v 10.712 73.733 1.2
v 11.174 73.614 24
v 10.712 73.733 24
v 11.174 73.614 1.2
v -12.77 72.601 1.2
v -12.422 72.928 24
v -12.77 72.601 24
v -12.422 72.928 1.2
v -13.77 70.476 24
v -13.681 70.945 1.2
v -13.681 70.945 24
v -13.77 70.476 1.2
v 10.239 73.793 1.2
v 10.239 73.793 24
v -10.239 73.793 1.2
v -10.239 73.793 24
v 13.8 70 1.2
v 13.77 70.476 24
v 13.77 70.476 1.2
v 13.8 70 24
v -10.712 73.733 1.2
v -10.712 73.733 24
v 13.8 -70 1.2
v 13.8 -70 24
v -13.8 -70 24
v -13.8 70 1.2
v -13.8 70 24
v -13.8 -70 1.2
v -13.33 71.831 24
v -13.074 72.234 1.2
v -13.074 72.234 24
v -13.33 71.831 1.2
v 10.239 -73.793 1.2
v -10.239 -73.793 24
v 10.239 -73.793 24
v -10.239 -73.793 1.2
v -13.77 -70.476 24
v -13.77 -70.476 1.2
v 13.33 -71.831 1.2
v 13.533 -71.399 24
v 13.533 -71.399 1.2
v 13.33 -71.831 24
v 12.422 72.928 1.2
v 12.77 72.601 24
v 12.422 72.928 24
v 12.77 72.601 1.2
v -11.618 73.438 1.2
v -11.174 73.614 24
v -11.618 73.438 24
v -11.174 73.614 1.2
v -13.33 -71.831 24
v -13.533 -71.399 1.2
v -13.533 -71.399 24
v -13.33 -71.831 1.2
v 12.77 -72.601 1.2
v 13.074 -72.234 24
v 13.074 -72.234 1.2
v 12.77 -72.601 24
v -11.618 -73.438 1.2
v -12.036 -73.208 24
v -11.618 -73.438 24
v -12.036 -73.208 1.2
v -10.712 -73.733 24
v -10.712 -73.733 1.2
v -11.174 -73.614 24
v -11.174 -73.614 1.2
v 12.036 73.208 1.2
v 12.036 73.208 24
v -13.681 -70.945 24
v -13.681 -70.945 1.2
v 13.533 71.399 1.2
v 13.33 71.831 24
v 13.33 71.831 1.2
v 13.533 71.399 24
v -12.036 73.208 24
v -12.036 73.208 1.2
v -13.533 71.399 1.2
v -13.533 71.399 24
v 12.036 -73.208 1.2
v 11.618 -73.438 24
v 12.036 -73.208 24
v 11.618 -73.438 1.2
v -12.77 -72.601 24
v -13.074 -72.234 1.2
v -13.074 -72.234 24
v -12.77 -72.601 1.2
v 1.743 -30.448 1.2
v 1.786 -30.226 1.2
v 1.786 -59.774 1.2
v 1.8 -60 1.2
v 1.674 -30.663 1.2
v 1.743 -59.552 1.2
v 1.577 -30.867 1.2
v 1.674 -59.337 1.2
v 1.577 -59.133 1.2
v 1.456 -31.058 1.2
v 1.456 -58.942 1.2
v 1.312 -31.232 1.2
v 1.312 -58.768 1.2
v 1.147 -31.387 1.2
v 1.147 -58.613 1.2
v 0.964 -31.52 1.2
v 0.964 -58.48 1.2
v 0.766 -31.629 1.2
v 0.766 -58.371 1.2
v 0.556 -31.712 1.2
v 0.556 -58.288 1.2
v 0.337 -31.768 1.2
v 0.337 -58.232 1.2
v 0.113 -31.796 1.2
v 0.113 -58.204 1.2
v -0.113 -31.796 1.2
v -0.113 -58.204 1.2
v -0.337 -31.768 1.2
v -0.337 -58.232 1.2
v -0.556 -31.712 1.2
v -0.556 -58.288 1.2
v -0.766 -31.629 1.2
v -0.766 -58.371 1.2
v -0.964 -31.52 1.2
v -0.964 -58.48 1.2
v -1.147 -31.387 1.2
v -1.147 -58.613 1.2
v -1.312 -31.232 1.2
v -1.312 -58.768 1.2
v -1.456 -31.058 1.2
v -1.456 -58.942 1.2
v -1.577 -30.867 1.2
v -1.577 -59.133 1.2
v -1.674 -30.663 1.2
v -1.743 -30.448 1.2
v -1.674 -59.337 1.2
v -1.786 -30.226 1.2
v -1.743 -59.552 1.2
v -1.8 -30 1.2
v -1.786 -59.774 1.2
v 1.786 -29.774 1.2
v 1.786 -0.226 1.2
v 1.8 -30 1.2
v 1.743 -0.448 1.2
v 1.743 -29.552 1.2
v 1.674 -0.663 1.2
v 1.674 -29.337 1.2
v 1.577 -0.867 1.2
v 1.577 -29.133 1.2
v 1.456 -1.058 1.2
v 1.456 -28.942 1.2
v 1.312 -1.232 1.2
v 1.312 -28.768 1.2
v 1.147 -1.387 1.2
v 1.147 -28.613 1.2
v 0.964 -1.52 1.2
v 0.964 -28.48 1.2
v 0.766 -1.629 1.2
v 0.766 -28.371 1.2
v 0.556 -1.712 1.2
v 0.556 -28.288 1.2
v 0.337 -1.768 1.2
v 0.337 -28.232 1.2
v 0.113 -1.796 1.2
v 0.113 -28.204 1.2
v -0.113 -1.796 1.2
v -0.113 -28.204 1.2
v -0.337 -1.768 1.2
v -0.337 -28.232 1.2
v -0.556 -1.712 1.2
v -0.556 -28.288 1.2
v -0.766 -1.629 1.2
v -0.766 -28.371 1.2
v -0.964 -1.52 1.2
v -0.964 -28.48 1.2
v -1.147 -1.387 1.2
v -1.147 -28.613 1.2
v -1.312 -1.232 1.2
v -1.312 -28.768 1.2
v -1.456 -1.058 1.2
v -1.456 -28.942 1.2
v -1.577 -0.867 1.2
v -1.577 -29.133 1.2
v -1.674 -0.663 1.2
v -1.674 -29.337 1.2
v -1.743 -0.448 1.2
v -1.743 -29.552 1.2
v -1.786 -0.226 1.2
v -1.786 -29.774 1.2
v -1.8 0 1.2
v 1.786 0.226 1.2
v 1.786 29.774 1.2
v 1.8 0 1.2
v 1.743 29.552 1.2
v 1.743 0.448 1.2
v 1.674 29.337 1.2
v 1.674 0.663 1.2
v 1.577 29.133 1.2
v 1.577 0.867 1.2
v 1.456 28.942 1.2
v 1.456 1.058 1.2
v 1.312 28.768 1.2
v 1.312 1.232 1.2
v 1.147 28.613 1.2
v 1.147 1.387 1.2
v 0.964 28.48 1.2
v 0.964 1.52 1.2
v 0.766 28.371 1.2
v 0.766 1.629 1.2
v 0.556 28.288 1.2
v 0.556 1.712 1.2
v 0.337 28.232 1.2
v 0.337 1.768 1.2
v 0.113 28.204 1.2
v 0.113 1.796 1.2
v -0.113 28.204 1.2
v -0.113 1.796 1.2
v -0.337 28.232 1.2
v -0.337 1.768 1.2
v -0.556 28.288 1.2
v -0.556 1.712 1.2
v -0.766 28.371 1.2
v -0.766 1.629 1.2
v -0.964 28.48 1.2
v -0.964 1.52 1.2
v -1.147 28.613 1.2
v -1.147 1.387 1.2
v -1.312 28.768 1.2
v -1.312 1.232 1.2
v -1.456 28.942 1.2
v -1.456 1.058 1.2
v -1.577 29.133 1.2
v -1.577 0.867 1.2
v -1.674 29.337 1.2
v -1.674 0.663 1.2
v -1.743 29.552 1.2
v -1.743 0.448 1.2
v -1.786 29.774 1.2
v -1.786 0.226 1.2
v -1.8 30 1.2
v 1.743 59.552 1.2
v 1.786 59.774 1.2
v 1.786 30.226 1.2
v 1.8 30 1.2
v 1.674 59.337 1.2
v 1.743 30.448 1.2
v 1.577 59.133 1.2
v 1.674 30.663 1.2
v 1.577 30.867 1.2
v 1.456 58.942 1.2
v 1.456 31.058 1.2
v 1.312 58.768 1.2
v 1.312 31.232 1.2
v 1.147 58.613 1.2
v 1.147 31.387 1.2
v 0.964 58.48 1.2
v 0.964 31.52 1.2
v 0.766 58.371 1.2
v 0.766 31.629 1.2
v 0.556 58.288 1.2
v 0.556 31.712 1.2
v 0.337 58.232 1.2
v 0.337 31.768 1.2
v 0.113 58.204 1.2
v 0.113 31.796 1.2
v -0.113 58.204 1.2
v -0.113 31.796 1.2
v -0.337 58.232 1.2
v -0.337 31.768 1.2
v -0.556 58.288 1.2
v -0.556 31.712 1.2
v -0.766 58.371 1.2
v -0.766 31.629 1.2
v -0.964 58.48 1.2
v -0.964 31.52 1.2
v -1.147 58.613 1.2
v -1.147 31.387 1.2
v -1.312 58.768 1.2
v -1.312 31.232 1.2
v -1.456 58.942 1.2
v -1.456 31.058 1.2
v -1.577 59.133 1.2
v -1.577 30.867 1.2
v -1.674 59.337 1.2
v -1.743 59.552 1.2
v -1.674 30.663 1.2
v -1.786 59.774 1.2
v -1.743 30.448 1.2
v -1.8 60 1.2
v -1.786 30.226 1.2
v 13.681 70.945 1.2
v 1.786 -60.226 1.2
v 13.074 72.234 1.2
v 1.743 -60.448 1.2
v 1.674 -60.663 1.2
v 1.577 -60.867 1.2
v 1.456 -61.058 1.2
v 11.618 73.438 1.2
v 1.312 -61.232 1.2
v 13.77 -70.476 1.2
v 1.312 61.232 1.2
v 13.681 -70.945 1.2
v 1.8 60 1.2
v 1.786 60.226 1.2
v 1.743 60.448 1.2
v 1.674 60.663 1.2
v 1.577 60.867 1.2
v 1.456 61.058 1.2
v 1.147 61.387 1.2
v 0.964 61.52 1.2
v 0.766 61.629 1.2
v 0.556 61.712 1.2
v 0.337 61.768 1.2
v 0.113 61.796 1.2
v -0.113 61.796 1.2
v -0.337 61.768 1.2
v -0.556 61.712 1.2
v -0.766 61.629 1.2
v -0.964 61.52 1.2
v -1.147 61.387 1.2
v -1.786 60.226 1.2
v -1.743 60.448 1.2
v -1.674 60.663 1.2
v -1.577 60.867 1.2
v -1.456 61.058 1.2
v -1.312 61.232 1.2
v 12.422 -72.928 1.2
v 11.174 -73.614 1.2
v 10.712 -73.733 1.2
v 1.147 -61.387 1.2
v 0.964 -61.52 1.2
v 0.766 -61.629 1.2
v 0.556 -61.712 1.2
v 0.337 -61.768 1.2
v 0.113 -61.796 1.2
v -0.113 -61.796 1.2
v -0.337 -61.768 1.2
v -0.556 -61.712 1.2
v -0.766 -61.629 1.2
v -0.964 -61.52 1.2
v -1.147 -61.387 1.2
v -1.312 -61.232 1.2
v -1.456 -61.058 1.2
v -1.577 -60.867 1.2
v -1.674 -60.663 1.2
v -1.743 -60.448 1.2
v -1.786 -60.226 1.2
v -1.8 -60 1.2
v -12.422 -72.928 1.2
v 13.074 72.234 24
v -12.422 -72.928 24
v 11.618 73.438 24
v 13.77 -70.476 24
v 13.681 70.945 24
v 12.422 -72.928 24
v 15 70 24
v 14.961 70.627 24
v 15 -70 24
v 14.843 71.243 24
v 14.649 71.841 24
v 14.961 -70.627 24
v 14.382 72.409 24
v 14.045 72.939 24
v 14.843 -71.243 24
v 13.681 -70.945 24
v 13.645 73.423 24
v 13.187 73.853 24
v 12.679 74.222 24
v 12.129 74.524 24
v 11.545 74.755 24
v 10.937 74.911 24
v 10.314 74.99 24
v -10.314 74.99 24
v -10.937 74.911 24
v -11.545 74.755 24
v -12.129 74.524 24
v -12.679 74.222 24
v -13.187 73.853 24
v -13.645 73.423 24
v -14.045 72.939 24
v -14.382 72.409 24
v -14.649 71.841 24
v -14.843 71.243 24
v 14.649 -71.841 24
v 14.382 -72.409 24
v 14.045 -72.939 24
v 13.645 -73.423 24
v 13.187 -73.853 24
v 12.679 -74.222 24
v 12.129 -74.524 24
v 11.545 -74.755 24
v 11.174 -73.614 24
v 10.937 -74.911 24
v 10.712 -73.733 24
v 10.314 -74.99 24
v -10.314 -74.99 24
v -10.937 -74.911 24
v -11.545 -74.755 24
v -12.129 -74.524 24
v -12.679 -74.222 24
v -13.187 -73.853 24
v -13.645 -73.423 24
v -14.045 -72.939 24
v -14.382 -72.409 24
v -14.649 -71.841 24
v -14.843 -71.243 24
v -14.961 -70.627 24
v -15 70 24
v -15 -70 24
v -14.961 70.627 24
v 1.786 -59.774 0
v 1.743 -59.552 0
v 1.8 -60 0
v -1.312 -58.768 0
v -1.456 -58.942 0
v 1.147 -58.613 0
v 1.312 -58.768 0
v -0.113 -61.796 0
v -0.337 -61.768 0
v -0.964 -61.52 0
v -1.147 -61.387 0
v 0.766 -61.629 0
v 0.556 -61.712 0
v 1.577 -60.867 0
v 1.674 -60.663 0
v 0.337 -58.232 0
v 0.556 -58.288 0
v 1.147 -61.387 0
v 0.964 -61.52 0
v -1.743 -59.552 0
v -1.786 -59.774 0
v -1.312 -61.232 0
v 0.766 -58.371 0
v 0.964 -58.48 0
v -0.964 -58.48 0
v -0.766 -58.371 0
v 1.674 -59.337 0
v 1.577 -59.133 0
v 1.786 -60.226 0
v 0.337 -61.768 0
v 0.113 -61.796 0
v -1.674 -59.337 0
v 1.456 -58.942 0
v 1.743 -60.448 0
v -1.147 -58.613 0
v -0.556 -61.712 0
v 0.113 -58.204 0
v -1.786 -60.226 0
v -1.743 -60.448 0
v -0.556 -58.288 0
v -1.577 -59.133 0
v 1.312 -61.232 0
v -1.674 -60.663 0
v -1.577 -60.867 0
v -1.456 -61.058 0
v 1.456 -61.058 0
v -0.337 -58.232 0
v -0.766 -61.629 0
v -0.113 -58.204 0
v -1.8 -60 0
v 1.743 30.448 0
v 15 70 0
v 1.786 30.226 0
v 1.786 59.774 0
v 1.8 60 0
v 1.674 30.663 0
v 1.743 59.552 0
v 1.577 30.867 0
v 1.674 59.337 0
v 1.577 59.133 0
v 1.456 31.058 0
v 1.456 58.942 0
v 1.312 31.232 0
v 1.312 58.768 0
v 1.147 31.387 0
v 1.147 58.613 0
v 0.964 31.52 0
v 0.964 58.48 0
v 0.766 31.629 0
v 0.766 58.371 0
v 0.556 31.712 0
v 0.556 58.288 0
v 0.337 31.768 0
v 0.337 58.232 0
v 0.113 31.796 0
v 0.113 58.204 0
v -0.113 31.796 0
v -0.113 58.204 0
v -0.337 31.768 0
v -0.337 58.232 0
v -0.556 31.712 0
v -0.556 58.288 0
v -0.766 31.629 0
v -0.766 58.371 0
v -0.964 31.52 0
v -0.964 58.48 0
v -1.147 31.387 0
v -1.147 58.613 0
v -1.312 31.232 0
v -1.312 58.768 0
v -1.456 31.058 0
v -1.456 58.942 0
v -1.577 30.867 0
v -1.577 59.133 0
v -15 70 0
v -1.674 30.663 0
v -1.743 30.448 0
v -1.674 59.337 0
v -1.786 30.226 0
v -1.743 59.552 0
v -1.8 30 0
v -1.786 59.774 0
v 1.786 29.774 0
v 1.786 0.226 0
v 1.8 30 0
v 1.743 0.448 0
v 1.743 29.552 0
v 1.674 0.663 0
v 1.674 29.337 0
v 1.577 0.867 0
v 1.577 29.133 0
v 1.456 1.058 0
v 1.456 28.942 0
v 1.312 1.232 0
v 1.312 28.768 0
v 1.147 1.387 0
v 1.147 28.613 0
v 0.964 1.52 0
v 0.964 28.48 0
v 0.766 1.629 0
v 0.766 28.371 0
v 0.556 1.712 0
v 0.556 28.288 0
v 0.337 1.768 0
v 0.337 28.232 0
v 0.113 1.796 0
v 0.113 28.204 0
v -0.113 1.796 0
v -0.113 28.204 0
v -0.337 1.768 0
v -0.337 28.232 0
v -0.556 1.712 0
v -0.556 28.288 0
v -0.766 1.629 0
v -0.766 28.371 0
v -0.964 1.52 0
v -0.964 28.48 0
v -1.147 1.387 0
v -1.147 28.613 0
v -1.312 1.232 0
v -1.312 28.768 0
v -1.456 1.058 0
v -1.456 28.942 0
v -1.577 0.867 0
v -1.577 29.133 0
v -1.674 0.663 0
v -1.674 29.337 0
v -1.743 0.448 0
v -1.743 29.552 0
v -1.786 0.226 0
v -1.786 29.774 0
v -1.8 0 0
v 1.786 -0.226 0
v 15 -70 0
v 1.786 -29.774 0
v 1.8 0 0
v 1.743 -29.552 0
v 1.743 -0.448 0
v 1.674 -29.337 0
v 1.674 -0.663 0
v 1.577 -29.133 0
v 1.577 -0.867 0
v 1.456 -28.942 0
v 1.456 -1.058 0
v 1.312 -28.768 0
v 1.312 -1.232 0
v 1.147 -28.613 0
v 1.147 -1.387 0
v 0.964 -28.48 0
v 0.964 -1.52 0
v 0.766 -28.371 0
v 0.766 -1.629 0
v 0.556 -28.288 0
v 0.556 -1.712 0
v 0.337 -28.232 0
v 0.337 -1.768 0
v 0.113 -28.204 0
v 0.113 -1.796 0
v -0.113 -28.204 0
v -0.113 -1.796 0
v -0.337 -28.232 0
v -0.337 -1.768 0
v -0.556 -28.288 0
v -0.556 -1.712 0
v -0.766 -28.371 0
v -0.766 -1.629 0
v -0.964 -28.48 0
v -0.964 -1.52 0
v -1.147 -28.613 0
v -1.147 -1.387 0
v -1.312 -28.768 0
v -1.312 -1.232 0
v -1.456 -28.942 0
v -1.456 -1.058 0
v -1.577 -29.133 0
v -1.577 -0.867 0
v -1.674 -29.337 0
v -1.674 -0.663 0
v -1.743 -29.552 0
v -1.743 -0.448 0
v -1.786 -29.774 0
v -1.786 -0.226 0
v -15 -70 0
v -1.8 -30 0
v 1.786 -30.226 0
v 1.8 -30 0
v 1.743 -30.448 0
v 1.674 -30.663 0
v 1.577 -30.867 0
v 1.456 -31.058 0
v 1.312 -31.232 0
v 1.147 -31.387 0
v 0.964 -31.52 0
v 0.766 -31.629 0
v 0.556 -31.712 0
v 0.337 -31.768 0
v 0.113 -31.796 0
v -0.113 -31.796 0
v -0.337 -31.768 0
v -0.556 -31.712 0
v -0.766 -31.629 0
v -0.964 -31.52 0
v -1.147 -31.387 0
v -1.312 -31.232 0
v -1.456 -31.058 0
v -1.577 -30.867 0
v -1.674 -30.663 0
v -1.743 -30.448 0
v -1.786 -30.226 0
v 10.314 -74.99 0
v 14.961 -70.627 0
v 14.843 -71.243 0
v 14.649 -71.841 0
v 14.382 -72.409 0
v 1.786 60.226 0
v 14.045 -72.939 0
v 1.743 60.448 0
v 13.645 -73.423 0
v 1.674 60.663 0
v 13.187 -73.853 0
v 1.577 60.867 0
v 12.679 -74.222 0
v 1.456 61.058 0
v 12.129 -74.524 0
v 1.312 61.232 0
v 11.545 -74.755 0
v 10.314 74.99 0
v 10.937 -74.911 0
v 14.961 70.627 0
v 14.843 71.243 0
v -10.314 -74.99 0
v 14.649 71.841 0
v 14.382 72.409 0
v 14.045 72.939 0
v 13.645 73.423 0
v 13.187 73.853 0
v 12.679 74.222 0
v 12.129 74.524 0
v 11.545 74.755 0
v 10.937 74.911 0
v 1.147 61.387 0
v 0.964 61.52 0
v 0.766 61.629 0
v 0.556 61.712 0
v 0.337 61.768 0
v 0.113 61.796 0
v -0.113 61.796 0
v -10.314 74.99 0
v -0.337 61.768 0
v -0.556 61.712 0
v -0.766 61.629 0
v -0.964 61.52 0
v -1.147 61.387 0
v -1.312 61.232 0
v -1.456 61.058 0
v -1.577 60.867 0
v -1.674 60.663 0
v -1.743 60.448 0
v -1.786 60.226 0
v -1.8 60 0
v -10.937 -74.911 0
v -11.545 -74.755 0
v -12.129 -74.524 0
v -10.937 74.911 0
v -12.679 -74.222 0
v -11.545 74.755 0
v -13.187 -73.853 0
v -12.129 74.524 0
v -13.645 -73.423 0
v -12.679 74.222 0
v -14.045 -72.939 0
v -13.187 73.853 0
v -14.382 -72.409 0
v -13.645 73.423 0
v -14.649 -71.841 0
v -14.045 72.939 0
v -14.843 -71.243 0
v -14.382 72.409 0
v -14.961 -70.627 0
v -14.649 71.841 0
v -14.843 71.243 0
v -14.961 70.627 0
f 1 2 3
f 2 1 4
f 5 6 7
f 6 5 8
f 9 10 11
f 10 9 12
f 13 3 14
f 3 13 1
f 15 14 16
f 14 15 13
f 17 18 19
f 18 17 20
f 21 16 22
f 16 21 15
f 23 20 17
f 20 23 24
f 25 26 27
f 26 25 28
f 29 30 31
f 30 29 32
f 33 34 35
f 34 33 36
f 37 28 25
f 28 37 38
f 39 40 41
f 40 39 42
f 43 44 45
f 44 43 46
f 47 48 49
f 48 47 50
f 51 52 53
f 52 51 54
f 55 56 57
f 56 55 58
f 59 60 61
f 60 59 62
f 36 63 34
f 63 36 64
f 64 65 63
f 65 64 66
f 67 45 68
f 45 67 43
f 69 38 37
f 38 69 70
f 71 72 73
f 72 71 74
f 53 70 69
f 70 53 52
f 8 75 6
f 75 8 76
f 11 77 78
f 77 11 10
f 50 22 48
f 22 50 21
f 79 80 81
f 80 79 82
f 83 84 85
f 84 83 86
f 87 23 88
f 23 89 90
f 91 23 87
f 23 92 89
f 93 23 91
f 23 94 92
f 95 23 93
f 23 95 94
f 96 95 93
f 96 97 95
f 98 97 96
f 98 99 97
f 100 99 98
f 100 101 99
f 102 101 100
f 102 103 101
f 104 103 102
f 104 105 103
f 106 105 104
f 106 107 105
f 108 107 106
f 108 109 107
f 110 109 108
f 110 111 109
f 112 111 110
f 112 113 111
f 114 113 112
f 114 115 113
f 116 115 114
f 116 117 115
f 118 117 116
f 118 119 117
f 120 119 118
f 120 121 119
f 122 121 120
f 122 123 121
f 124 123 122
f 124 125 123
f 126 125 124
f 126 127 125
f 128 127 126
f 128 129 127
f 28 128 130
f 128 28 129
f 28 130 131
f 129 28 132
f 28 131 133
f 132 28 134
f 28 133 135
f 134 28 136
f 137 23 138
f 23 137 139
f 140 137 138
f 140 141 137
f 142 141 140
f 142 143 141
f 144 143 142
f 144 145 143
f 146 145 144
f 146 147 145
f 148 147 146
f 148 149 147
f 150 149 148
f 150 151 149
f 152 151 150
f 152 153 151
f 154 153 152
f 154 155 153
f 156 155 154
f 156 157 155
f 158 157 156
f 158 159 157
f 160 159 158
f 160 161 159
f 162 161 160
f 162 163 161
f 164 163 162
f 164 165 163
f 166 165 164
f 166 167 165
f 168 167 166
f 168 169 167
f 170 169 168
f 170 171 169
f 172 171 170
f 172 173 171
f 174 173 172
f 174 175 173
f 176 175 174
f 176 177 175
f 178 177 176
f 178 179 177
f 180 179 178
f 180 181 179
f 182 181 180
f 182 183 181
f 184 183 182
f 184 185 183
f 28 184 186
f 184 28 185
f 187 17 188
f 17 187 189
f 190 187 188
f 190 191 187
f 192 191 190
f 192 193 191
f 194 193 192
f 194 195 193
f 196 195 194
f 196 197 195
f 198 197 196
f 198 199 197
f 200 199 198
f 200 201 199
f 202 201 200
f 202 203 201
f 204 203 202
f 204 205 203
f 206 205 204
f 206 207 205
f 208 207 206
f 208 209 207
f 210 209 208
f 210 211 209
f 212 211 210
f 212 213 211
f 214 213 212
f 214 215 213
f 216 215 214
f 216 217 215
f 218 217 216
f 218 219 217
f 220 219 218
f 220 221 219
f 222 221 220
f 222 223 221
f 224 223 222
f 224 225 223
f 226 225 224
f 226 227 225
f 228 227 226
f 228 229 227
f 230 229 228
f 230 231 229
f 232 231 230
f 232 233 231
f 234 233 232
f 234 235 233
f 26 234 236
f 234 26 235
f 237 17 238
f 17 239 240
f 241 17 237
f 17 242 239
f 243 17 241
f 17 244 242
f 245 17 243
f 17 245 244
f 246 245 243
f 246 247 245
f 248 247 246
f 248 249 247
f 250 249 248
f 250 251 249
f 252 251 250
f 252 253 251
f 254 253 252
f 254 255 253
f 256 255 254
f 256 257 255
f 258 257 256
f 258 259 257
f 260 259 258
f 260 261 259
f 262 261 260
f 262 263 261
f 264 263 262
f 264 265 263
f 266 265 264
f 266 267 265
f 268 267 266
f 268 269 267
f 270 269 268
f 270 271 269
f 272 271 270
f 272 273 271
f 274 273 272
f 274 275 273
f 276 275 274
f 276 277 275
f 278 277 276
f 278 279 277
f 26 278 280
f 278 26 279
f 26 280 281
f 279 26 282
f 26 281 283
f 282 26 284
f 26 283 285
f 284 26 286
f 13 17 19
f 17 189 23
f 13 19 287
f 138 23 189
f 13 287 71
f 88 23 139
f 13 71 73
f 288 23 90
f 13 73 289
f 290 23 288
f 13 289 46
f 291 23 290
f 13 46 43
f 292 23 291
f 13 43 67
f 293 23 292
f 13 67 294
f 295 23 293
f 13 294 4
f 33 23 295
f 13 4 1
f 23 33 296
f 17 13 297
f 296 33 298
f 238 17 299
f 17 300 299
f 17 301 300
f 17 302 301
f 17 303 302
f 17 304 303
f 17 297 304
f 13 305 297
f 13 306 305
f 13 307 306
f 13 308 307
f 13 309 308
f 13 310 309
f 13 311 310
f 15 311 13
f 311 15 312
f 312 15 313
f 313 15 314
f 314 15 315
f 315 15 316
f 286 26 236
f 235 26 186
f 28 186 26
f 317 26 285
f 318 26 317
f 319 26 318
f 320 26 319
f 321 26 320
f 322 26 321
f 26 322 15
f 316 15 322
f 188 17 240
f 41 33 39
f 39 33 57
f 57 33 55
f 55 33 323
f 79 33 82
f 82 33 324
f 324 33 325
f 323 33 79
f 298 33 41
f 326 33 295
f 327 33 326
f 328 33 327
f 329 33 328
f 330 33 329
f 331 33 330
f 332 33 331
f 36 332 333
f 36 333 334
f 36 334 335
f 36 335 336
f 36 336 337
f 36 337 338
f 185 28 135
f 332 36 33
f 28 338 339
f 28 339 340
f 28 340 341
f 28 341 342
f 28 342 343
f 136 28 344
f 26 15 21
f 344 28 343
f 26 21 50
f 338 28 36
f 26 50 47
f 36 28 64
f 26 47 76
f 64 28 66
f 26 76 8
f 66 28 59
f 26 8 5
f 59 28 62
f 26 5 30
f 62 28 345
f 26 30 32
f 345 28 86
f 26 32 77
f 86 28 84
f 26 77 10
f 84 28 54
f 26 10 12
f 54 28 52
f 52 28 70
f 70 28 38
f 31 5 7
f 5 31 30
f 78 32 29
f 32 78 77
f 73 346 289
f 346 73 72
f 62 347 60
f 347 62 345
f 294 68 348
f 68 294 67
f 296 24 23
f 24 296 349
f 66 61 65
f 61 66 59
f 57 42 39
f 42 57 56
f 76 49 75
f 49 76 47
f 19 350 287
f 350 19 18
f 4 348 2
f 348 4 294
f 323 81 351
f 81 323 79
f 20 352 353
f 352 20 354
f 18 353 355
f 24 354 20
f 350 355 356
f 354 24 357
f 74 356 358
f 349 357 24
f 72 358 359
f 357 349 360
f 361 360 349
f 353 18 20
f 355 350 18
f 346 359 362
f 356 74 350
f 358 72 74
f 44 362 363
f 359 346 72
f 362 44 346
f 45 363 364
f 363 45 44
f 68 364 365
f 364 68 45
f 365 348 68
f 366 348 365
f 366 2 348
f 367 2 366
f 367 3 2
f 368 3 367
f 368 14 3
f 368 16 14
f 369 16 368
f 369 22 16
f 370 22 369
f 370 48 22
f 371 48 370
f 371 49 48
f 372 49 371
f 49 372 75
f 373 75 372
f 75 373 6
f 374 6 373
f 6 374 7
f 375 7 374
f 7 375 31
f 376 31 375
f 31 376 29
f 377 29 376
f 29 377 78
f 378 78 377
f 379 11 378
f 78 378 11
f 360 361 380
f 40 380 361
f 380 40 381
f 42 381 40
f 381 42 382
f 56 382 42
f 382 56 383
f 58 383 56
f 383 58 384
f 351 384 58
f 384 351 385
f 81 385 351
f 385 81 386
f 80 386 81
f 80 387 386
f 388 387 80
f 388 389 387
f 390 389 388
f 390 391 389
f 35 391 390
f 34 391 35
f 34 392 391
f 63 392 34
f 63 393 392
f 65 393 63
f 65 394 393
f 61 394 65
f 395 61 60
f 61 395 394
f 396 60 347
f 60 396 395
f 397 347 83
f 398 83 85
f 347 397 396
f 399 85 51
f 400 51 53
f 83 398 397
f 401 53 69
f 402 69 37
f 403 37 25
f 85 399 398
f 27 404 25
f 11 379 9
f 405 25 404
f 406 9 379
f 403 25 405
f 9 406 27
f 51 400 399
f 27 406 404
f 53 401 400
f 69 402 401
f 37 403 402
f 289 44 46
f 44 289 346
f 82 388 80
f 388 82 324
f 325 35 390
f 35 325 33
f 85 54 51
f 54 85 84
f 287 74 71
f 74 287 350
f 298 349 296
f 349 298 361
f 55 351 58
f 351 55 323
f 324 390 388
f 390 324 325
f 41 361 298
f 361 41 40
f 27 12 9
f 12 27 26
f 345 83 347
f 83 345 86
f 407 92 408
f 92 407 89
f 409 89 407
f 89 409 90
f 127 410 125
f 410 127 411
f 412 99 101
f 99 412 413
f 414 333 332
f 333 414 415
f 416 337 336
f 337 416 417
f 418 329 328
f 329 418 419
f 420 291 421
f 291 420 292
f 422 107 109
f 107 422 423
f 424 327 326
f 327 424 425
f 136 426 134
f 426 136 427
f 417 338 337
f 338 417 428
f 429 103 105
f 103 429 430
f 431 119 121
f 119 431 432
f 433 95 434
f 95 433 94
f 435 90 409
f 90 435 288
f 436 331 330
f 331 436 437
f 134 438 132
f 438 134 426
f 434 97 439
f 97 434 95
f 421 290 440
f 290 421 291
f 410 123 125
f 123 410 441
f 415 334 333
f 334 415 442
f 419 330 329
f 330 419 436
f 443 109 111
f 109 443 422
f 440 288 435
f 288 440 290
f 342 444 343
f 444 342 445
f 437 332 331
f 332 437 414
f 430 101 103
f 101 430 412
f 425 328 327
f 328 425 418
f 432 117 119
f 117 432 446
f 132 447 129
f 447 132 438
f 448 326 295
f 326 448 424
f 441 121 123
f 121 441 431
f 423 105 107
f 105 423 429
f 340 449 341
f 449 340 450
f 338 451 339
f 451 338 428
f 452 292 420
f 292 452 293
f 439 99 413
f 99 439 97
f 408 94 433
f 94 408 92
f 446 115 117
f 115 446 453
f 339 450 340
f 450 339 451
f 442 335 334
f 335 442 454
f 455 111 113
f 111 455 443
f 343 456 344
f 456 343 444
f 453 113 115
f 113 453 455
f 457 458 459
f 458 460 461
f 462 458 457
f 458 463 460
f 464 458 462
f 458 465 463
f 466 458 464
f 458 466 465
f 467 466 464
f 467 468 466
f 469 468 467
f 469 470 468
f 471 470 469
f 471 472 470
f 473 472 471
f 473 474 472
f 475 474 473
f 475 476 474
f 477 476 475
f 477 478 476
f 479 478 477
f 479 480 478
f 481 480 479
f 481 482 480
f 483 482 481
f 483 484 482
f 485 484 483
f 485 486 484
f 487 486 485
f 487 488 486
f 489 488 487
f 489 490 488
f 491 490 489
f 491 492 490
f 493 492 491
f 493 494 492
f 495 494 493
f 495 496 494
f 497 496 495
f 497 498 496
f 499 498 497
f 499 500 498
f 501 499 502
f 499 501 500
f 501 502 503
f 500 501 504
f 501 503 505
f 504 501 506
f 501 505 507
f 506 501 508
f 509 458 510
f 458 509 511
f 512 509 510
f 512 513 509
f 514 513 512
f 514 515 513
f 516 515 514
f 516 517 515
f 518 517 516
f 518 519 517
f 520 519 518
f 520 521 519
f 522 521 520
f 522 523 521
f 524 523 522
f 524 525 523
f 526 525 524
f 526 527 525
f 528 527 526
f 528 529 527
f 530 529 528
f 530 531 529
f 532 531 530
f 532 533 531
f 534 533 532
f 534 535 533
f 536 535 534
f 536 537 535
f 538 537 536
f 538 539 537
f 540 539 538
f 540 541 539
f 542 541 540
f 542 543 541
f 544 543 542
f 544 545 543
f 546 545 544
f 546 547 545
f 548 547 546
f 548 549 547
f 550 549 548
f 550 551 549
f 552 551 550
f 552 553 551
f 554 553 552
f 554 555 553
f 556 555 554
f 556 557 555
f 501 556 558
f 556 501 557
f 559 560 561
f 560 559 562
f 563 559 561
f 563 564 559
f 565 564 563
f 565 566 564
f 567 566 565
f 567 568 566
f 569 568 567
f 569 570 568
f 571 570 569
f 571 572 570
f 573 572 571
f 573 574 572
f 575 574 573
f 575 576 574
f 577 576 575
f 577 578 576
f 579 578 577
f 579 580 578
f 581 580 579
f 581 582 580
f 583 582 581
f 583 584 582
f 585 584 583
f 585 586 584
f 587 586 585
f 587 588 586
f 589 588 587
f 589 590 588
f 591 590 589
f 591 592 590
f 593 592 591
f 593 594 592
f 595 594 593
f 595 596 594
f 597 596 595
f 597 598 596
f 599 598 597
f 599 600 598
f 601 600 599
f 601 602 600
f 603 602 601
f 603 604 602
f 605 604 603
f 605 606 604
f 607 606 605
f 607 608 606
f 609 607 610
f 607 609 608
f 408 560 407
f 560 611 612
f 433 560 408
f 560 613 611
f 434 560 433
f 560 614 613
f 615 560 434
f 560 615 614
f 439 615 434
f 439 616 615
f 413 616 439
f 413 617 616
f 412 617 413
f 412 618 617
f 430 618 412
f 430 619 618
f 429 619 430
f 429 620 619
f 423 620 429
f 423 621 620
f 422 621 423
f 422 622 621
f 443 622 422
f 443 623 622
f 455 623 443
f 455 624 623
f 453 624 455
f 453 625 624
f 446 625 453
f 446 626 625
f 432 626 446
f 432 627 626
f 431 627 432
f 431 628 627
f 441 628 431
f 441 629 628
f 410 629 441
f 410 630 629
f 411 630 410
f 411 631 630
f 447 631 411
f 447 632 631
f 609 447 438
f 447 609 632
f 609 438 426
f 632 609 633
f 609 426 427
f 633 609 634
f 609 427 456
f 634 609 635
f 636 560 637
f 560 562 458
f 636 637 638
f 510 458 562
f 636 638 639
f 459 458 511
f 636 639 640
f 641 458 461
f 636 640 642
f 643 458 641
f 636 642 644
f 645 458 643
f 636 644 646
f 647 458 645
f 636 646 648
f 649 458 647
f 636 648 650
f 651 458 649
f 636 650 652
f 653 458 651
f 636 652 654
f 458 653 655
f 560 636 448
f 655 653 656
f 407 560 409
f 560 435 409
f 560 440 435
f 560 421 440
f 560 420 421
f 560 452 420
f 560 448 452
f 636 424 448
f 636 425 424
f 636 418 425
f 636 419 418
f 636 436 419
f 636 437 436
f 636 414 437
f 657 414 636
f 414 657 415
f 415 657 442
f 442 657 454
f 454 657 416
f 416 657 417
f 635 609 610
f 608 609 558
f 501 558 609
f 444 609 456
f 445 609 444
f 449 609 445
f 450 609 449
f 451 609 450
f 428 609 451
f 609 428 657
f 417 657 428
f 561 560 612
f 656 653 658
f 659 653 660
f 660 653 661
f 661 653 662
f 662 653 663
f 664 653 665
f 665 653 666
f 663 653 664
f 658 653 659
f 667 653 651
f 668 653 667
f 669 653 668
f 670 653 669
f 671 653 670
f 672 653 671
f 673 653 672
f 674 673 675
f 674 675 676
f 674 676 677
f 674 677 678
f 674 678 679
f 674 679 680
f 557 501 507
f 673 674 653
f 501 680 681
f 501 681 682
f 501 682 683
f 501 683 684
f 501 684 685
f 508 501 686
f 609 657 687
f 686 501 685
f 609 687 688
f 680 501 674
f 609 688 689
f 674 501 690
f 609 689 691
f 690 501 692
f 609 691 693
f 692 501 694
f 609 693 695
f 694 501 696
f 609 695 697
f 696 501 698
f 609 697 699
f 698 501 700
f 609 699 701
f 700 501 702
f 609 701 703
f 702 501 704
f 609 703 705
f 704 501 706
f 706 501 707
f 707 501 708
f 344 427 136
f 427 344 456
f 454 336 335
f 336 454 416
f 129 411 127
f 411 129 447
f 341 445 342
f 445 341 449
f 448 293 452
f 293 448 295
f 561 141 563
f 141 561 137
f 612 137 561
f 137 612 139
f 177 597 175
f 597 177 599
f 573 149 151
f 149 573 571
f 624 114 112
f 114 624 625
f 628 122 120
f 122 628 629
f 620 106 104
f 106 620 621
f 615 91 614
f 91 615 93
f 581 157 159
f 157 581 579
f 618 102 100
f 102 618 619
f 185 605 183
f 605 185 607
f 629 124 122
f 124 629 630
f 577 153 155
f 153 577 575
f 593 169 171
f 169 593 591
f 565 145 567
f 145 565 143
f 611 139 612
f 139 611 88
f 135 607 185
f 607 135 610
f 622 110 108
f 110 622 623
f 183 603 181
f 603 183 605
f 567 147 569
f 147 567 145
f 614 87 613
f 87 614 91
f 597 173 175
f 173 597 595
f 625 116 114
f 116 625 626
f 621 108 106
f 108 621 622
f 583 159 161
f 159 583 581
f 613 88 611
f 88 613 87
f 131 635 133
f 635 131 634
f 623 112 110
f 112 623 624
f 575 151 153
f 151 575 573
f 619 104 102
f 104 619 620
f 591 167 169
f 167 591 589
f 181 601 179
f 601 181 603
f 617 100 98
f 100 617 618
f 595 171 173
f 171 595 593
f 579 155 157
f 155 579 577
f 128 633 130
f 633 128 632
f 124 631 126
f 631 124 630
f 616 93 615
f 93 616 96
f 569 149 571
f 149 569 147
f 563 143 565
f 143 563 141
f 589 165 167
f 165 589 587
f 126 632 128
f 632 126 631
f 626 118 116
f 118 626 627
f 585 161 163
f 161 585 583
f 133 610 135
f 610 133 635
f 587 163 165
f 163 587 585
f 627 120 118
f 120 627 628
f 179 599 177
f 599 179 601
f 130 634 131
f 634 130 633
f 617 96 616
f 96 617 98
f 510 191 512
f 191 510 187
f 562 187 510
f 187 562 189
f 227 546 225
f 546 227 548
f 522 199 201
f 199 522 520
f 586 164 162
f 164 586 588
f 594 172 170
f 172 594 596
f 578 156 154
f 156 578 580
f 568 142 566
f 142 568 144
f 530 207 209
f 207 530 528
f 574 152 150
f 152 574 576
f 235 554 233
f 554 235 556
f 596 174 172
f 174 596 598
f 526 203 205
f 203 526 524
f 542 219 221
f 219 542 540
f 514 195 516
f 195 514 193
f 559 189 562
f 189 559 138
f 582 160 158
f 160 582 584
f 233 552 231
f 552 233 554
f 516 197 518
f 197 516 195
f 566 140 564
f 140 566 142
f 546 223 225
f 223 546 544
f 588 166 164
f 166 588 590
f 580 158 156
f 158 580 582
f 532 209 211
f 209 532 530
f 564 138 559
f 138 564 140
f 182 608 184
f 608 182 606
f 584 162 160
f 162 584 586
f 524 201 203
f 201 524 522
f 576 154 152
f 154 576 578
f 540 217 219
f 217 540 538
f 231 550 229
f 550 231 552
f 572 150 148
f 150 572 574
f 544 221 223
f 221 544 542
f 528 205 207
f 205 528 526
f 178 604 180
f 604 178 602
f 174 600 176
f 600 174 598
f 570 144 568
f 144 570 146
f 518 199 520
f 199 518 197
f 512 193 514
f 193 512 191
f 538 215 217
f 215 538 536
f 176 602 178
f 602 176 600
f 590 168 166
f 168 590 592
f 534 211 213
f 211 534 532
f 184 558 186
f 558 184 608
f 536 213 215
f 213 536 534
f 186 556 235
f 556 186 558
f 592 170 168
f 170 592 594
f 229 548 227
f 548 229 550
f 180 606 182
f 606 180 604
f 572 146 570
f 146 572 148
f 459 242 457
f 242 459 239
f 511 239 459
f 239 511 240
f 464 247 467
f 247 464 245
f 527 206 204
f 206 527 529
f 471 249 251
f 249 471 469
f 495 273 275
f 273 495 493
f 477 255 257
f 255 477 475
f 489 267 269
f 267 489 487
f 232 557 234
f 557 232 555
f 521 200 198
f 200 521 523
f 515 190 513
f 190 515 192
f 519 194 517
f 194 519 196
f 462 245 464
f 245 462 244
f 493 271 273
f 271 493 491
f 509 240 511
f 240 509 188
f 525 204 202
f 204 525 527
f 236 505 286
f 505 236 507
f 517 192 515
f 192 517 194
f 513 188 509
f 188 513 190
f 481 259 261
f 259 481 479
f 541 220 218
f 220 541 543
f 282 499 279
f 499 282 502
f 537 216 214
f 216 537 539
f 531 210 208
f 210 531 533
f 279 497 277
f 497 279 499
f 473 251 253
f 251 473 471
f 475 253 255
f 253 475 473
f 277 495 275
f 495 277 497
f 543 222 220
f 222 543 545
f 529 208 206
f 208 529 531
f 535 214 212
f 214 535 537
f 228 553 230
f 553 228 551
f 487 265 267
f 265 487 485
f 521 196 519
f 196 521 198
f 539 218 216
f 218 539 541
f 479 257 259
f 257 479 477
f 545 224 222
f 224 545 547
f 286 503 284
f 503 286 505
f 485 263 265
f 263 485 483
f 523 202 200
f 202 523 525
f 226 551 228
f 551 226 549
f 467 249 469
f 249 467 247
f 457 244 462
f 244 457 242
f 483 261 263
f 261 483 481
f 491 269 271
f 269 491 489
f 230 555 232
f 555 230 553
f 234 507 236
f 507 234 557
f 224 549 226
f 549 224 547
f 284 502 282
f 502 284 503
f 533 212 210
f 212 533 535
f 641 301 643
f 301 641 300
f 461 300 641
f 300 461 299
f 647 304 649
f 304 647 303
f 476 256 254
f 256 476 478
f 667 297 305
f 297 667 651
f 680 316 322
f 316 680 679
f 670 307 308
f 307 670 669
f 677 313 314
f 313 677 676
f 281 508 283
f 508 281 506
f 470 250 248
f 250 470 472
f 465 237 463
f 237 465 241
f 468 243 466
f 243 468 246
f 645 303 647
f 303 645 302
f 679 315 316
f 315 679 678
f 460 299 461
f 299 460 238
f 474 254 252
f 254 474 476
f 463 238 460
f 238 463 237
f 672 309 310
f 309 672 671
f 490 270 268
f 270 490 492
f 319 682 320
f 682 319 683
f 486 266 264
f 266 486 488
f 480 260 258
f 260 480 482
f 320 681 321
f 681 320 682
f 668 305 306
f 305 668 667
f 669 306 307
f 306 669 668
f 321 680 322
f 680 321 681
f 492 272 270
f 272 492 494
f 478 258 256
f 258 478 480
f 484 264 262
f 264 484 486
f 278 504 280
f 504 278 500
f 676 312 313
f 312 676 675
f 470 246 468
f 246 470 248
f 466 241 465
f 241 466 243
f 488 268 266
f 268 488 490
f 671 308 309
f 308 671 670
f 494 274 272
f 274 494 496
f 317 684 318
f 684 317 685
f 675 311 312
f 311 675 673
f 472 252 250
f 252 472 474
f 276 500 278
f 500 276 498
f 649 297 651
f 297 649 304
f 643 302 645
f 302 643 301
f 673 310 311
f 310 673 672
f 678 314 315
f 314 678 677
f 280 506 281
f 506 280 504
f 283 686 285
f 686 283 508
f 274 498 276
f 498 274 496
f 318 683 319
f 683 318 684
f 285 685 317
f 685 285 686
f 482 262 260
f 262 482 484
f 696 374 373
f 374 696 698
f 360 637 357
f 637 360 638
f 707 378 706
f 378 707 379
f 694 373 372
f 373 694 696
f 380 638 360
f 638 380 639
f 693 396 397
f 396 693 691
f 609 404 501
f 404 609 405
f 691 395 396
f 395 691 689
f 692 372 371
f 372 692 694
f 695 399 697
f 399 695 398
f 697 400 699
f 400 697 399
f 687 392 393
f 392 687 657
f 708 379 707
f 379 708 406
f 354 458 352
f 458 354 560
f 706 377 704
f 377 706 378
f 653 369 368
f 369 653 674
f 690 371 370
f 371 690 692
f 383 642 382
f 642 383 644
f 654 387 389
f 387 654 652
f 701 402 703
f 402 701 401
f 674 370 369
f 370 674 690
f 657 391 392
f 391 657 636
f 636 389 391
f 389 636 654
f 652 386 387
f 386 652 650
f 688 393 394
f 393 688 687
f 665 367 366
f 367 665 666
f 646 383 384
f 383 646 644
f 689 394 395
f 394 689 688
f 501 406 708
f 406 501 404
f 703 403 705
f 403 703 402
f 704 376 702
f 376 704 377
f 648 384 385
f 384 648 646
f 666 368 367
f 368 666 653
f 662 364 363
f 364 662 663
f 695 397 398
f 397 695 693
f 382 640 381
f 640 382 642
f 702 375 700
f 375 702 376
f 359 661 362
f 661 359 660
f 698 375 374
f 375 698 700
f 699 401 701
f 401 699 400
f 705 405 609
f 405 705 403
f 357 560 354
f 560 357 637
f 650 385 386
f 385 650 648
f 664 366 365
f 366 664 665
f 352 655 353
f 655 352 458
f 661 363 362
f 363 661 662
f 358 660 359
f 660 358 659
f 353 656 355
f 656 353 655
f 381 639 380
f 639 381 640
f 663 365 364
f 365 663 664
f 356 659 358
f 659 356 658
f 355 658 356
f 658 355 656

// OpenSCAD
$fn = 50;


difference() {
	union() {
		hull() {
			translate(v = [-10.0000000000, 70.0000000000, 0]) {
				cylinder(h = 24, r = 5);
			}
			translate(v = [10.0000000000, 70.0000000000, 0]) {
				cylinder(h = 24, r = 5);
			}
			translate(v = [-10.0000000000, -70.0000000000, 0]) {
				cylinder(h = 24, r = 5);
			}
			translate(v = [10.0000000000, -70.0000000000, 0]) {
				cylinder(h = 24, r = 5);
			}
		}
	}
	union() {
		translate(v = [0, 0, 1.2000000000]) {
			hull() {
				translate(v = [-10.0000000000, 70.0000000000, 0]) {
					cylinder(h = 22.8000000000, r = 3.8000000000);
				}
				translate(v = [10.0000000000, 70.0000000000, 0]) {
					cylinder(h = 22.8000000000, r = 3.8000000000);
				}
				translate(v = [-10.0000000000, -70.0000000000, 0]) {
					cylinder(h = 22.8000000000, r = 3.8000000000);
				}
				translate(v = [10.0000000000, -70.0000000000, 0]) {
					cylinder(h = 22.8000000000, r = 3.8000000000);
				}
			}
		}
		#translate(v = [0.0000000000, -60.0000000000, 0]) {
			cylinder(h = 1.2000000000, r = 1.8000000000);
		}
		#translate(v = [0.0000000000, -30.0000000000, 0]) {
			cylinder(h = 1.2000000000, r = 1.8000000000);
		}
		#cylinder(h = 1.2000000000, r = 1.8000000000);
		#translate(v = [0.0000000000, 30.0000000000, 0]) {
			cylinder(h = 1.2000000000, r = 1.8000000000);
		}
		#translate(v = [0.0000000000, 60.0000000000, 0]) {
			cylinder(h = 1.2000000000, r = 1.8000000000);
		}
	}
}
